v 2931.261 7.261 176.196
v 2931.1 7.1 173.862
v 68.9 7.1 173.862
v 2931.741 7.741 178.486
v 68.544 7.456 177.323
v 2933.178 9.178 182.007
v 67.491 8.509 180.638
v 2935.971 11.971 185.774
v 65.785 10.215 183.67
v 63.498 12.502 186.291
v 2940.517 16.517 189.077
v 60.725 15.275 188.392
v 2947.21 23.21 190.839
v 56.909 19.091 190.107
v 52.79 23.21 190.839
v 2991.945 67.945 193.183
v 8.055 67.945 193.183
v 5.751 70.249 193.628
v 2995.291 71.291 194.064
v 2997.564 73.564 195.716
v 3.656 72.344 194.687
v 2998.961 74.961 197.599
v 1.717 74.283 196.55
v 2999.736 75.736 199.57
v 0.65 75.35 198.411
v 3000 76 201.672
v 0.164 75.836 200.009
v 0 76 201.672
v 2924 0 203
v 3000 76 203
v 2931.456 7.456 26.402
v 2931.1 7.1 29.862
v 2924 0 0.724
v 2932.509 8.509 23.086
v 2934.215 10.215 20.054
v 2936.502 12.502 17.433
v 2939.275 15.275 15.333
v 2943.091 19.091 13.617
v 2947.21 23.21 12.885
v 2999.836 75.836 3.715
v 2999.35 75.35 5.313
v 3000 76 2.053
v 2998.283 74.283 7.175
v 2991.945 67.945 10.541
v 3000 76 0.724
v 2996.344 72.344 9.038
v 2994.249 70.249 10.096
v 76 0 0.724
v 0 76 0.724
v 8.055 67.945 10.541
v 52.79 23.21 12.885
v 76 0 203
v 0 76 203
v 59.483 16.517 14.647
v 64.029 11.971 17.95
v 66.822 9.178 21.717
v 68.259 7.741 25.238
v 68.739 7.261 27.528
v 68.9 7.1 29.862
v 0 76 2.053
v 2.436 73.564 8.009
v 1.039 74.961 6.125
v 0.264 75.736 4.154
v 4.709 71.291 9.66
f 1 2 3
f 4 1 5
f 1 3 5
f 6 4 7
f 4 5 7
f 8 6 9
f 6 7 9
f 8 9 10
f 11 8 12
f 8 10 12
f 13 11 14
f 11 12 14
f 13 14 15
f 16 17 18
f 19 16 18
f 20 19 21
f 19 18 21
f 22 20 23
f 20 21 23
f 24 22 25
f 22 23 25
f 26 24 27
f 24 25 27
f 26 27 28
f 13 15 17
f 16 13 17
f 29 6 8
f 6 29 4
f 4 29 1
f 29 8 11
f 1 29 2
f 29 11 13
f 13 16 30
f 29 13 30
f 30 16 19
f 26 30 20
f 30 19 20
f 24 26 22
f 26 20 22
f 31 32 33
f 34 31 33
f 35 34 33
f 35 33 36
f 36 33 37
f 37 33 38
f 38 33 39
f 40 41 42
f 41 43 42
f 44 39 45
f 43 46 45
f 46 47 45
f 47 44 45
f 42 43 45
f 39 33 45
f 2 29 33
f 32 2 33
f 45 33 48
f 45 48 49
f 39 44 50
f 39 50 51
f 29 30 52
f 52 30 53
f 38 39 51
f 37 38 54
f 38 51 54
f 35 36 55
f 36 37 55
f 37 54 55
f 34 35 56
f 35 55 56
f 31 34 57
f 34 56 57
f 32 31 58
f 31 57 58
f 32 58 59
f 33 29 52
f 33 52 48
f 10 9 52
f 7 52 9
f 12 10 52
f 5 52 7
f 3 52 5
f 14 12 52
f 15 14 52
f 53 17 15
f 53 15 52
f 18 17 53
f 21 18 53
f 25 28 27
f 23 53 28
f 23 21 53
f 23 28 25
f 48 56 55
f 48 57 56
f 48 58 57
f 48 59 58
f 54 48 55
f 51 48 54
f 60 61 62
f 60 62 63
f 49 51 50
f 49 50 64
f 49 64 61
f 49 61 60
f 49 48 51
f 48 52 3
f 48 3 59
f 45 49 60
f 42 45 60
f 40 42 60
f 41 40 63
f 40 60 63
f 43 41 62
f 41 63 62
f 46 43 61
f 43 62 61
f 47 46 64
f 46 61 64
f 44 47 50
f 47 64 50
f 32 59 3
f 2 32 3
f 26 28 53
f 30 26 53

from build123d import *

# Parameters (mm, degrees)
F1_DEPTH = 3000
F3_DEPTH = 203.001


# Not quite as in the source:
# - a pattern or mirror of a feature is missing from the dataset's text; its kind, count and spacing are read off the source's solid


with BuildPart() as f1:
    # F0 (on Right) → F1 (new body)
    with BuildSketch(Plane.YZ):
        with BuildLine():
            Line((0, 203), (0, 0.7243087391))
            Line((0, 0.7243087391), (76, 0.7243087391))
            Line((76, 0.7243087391), (76, 2.0526619257))
            ThreePointArc((76, 2.0526619257), (73.6656821536, 7.9036758191), (67.9448556281, 10.5410129711))
            Line((67.9448556281, 10.5410129711), (23.2102887439, 12.8854522787))
            ThreePointArc((23.2102887439, 12.8854522787), (11.7686356928, 18.1601265828), (7.1, 29.8621543695))
            Line((7.1, 29.8621543695), (7.1, 173.8621543695))
            ThreePointArc((7.1, 173.8621543695), (11.7686356928, 185.5641821563), (23.2102887439, 190.8388564604))
            Line((23.2102887439, 190.8388564604), (67.9448556281, 193.183295768))
            ThreePointArc((67.9448556281, 193.183295768), (73.6656821536, 195.82063292), (76, 201.6716468134))
            Line((76, 201.6716468134), (76, 203))
            Line((76, 203), (0, 203))
        make_face()
    extrude(amount=F1_DEPTH)

    # F2 (on Top) → F3 (cut, through all)
    with BuildSketch(Plane.XY):
        Polygon((0, 76), (0, 0), (76, 0), align=None)
    f3 = extrude(amount=F3_DEPTH, mode=Mode.SUBTRACT)

    # F3_copies: F3 across plane
    add(f3.mirror(Plane(origin=(1500, 0, 0), x_dir=(0, 0, 1), z_dir=(1, 0, 0))), mode=Mode.SUBTRACT)


solid = f1.part
